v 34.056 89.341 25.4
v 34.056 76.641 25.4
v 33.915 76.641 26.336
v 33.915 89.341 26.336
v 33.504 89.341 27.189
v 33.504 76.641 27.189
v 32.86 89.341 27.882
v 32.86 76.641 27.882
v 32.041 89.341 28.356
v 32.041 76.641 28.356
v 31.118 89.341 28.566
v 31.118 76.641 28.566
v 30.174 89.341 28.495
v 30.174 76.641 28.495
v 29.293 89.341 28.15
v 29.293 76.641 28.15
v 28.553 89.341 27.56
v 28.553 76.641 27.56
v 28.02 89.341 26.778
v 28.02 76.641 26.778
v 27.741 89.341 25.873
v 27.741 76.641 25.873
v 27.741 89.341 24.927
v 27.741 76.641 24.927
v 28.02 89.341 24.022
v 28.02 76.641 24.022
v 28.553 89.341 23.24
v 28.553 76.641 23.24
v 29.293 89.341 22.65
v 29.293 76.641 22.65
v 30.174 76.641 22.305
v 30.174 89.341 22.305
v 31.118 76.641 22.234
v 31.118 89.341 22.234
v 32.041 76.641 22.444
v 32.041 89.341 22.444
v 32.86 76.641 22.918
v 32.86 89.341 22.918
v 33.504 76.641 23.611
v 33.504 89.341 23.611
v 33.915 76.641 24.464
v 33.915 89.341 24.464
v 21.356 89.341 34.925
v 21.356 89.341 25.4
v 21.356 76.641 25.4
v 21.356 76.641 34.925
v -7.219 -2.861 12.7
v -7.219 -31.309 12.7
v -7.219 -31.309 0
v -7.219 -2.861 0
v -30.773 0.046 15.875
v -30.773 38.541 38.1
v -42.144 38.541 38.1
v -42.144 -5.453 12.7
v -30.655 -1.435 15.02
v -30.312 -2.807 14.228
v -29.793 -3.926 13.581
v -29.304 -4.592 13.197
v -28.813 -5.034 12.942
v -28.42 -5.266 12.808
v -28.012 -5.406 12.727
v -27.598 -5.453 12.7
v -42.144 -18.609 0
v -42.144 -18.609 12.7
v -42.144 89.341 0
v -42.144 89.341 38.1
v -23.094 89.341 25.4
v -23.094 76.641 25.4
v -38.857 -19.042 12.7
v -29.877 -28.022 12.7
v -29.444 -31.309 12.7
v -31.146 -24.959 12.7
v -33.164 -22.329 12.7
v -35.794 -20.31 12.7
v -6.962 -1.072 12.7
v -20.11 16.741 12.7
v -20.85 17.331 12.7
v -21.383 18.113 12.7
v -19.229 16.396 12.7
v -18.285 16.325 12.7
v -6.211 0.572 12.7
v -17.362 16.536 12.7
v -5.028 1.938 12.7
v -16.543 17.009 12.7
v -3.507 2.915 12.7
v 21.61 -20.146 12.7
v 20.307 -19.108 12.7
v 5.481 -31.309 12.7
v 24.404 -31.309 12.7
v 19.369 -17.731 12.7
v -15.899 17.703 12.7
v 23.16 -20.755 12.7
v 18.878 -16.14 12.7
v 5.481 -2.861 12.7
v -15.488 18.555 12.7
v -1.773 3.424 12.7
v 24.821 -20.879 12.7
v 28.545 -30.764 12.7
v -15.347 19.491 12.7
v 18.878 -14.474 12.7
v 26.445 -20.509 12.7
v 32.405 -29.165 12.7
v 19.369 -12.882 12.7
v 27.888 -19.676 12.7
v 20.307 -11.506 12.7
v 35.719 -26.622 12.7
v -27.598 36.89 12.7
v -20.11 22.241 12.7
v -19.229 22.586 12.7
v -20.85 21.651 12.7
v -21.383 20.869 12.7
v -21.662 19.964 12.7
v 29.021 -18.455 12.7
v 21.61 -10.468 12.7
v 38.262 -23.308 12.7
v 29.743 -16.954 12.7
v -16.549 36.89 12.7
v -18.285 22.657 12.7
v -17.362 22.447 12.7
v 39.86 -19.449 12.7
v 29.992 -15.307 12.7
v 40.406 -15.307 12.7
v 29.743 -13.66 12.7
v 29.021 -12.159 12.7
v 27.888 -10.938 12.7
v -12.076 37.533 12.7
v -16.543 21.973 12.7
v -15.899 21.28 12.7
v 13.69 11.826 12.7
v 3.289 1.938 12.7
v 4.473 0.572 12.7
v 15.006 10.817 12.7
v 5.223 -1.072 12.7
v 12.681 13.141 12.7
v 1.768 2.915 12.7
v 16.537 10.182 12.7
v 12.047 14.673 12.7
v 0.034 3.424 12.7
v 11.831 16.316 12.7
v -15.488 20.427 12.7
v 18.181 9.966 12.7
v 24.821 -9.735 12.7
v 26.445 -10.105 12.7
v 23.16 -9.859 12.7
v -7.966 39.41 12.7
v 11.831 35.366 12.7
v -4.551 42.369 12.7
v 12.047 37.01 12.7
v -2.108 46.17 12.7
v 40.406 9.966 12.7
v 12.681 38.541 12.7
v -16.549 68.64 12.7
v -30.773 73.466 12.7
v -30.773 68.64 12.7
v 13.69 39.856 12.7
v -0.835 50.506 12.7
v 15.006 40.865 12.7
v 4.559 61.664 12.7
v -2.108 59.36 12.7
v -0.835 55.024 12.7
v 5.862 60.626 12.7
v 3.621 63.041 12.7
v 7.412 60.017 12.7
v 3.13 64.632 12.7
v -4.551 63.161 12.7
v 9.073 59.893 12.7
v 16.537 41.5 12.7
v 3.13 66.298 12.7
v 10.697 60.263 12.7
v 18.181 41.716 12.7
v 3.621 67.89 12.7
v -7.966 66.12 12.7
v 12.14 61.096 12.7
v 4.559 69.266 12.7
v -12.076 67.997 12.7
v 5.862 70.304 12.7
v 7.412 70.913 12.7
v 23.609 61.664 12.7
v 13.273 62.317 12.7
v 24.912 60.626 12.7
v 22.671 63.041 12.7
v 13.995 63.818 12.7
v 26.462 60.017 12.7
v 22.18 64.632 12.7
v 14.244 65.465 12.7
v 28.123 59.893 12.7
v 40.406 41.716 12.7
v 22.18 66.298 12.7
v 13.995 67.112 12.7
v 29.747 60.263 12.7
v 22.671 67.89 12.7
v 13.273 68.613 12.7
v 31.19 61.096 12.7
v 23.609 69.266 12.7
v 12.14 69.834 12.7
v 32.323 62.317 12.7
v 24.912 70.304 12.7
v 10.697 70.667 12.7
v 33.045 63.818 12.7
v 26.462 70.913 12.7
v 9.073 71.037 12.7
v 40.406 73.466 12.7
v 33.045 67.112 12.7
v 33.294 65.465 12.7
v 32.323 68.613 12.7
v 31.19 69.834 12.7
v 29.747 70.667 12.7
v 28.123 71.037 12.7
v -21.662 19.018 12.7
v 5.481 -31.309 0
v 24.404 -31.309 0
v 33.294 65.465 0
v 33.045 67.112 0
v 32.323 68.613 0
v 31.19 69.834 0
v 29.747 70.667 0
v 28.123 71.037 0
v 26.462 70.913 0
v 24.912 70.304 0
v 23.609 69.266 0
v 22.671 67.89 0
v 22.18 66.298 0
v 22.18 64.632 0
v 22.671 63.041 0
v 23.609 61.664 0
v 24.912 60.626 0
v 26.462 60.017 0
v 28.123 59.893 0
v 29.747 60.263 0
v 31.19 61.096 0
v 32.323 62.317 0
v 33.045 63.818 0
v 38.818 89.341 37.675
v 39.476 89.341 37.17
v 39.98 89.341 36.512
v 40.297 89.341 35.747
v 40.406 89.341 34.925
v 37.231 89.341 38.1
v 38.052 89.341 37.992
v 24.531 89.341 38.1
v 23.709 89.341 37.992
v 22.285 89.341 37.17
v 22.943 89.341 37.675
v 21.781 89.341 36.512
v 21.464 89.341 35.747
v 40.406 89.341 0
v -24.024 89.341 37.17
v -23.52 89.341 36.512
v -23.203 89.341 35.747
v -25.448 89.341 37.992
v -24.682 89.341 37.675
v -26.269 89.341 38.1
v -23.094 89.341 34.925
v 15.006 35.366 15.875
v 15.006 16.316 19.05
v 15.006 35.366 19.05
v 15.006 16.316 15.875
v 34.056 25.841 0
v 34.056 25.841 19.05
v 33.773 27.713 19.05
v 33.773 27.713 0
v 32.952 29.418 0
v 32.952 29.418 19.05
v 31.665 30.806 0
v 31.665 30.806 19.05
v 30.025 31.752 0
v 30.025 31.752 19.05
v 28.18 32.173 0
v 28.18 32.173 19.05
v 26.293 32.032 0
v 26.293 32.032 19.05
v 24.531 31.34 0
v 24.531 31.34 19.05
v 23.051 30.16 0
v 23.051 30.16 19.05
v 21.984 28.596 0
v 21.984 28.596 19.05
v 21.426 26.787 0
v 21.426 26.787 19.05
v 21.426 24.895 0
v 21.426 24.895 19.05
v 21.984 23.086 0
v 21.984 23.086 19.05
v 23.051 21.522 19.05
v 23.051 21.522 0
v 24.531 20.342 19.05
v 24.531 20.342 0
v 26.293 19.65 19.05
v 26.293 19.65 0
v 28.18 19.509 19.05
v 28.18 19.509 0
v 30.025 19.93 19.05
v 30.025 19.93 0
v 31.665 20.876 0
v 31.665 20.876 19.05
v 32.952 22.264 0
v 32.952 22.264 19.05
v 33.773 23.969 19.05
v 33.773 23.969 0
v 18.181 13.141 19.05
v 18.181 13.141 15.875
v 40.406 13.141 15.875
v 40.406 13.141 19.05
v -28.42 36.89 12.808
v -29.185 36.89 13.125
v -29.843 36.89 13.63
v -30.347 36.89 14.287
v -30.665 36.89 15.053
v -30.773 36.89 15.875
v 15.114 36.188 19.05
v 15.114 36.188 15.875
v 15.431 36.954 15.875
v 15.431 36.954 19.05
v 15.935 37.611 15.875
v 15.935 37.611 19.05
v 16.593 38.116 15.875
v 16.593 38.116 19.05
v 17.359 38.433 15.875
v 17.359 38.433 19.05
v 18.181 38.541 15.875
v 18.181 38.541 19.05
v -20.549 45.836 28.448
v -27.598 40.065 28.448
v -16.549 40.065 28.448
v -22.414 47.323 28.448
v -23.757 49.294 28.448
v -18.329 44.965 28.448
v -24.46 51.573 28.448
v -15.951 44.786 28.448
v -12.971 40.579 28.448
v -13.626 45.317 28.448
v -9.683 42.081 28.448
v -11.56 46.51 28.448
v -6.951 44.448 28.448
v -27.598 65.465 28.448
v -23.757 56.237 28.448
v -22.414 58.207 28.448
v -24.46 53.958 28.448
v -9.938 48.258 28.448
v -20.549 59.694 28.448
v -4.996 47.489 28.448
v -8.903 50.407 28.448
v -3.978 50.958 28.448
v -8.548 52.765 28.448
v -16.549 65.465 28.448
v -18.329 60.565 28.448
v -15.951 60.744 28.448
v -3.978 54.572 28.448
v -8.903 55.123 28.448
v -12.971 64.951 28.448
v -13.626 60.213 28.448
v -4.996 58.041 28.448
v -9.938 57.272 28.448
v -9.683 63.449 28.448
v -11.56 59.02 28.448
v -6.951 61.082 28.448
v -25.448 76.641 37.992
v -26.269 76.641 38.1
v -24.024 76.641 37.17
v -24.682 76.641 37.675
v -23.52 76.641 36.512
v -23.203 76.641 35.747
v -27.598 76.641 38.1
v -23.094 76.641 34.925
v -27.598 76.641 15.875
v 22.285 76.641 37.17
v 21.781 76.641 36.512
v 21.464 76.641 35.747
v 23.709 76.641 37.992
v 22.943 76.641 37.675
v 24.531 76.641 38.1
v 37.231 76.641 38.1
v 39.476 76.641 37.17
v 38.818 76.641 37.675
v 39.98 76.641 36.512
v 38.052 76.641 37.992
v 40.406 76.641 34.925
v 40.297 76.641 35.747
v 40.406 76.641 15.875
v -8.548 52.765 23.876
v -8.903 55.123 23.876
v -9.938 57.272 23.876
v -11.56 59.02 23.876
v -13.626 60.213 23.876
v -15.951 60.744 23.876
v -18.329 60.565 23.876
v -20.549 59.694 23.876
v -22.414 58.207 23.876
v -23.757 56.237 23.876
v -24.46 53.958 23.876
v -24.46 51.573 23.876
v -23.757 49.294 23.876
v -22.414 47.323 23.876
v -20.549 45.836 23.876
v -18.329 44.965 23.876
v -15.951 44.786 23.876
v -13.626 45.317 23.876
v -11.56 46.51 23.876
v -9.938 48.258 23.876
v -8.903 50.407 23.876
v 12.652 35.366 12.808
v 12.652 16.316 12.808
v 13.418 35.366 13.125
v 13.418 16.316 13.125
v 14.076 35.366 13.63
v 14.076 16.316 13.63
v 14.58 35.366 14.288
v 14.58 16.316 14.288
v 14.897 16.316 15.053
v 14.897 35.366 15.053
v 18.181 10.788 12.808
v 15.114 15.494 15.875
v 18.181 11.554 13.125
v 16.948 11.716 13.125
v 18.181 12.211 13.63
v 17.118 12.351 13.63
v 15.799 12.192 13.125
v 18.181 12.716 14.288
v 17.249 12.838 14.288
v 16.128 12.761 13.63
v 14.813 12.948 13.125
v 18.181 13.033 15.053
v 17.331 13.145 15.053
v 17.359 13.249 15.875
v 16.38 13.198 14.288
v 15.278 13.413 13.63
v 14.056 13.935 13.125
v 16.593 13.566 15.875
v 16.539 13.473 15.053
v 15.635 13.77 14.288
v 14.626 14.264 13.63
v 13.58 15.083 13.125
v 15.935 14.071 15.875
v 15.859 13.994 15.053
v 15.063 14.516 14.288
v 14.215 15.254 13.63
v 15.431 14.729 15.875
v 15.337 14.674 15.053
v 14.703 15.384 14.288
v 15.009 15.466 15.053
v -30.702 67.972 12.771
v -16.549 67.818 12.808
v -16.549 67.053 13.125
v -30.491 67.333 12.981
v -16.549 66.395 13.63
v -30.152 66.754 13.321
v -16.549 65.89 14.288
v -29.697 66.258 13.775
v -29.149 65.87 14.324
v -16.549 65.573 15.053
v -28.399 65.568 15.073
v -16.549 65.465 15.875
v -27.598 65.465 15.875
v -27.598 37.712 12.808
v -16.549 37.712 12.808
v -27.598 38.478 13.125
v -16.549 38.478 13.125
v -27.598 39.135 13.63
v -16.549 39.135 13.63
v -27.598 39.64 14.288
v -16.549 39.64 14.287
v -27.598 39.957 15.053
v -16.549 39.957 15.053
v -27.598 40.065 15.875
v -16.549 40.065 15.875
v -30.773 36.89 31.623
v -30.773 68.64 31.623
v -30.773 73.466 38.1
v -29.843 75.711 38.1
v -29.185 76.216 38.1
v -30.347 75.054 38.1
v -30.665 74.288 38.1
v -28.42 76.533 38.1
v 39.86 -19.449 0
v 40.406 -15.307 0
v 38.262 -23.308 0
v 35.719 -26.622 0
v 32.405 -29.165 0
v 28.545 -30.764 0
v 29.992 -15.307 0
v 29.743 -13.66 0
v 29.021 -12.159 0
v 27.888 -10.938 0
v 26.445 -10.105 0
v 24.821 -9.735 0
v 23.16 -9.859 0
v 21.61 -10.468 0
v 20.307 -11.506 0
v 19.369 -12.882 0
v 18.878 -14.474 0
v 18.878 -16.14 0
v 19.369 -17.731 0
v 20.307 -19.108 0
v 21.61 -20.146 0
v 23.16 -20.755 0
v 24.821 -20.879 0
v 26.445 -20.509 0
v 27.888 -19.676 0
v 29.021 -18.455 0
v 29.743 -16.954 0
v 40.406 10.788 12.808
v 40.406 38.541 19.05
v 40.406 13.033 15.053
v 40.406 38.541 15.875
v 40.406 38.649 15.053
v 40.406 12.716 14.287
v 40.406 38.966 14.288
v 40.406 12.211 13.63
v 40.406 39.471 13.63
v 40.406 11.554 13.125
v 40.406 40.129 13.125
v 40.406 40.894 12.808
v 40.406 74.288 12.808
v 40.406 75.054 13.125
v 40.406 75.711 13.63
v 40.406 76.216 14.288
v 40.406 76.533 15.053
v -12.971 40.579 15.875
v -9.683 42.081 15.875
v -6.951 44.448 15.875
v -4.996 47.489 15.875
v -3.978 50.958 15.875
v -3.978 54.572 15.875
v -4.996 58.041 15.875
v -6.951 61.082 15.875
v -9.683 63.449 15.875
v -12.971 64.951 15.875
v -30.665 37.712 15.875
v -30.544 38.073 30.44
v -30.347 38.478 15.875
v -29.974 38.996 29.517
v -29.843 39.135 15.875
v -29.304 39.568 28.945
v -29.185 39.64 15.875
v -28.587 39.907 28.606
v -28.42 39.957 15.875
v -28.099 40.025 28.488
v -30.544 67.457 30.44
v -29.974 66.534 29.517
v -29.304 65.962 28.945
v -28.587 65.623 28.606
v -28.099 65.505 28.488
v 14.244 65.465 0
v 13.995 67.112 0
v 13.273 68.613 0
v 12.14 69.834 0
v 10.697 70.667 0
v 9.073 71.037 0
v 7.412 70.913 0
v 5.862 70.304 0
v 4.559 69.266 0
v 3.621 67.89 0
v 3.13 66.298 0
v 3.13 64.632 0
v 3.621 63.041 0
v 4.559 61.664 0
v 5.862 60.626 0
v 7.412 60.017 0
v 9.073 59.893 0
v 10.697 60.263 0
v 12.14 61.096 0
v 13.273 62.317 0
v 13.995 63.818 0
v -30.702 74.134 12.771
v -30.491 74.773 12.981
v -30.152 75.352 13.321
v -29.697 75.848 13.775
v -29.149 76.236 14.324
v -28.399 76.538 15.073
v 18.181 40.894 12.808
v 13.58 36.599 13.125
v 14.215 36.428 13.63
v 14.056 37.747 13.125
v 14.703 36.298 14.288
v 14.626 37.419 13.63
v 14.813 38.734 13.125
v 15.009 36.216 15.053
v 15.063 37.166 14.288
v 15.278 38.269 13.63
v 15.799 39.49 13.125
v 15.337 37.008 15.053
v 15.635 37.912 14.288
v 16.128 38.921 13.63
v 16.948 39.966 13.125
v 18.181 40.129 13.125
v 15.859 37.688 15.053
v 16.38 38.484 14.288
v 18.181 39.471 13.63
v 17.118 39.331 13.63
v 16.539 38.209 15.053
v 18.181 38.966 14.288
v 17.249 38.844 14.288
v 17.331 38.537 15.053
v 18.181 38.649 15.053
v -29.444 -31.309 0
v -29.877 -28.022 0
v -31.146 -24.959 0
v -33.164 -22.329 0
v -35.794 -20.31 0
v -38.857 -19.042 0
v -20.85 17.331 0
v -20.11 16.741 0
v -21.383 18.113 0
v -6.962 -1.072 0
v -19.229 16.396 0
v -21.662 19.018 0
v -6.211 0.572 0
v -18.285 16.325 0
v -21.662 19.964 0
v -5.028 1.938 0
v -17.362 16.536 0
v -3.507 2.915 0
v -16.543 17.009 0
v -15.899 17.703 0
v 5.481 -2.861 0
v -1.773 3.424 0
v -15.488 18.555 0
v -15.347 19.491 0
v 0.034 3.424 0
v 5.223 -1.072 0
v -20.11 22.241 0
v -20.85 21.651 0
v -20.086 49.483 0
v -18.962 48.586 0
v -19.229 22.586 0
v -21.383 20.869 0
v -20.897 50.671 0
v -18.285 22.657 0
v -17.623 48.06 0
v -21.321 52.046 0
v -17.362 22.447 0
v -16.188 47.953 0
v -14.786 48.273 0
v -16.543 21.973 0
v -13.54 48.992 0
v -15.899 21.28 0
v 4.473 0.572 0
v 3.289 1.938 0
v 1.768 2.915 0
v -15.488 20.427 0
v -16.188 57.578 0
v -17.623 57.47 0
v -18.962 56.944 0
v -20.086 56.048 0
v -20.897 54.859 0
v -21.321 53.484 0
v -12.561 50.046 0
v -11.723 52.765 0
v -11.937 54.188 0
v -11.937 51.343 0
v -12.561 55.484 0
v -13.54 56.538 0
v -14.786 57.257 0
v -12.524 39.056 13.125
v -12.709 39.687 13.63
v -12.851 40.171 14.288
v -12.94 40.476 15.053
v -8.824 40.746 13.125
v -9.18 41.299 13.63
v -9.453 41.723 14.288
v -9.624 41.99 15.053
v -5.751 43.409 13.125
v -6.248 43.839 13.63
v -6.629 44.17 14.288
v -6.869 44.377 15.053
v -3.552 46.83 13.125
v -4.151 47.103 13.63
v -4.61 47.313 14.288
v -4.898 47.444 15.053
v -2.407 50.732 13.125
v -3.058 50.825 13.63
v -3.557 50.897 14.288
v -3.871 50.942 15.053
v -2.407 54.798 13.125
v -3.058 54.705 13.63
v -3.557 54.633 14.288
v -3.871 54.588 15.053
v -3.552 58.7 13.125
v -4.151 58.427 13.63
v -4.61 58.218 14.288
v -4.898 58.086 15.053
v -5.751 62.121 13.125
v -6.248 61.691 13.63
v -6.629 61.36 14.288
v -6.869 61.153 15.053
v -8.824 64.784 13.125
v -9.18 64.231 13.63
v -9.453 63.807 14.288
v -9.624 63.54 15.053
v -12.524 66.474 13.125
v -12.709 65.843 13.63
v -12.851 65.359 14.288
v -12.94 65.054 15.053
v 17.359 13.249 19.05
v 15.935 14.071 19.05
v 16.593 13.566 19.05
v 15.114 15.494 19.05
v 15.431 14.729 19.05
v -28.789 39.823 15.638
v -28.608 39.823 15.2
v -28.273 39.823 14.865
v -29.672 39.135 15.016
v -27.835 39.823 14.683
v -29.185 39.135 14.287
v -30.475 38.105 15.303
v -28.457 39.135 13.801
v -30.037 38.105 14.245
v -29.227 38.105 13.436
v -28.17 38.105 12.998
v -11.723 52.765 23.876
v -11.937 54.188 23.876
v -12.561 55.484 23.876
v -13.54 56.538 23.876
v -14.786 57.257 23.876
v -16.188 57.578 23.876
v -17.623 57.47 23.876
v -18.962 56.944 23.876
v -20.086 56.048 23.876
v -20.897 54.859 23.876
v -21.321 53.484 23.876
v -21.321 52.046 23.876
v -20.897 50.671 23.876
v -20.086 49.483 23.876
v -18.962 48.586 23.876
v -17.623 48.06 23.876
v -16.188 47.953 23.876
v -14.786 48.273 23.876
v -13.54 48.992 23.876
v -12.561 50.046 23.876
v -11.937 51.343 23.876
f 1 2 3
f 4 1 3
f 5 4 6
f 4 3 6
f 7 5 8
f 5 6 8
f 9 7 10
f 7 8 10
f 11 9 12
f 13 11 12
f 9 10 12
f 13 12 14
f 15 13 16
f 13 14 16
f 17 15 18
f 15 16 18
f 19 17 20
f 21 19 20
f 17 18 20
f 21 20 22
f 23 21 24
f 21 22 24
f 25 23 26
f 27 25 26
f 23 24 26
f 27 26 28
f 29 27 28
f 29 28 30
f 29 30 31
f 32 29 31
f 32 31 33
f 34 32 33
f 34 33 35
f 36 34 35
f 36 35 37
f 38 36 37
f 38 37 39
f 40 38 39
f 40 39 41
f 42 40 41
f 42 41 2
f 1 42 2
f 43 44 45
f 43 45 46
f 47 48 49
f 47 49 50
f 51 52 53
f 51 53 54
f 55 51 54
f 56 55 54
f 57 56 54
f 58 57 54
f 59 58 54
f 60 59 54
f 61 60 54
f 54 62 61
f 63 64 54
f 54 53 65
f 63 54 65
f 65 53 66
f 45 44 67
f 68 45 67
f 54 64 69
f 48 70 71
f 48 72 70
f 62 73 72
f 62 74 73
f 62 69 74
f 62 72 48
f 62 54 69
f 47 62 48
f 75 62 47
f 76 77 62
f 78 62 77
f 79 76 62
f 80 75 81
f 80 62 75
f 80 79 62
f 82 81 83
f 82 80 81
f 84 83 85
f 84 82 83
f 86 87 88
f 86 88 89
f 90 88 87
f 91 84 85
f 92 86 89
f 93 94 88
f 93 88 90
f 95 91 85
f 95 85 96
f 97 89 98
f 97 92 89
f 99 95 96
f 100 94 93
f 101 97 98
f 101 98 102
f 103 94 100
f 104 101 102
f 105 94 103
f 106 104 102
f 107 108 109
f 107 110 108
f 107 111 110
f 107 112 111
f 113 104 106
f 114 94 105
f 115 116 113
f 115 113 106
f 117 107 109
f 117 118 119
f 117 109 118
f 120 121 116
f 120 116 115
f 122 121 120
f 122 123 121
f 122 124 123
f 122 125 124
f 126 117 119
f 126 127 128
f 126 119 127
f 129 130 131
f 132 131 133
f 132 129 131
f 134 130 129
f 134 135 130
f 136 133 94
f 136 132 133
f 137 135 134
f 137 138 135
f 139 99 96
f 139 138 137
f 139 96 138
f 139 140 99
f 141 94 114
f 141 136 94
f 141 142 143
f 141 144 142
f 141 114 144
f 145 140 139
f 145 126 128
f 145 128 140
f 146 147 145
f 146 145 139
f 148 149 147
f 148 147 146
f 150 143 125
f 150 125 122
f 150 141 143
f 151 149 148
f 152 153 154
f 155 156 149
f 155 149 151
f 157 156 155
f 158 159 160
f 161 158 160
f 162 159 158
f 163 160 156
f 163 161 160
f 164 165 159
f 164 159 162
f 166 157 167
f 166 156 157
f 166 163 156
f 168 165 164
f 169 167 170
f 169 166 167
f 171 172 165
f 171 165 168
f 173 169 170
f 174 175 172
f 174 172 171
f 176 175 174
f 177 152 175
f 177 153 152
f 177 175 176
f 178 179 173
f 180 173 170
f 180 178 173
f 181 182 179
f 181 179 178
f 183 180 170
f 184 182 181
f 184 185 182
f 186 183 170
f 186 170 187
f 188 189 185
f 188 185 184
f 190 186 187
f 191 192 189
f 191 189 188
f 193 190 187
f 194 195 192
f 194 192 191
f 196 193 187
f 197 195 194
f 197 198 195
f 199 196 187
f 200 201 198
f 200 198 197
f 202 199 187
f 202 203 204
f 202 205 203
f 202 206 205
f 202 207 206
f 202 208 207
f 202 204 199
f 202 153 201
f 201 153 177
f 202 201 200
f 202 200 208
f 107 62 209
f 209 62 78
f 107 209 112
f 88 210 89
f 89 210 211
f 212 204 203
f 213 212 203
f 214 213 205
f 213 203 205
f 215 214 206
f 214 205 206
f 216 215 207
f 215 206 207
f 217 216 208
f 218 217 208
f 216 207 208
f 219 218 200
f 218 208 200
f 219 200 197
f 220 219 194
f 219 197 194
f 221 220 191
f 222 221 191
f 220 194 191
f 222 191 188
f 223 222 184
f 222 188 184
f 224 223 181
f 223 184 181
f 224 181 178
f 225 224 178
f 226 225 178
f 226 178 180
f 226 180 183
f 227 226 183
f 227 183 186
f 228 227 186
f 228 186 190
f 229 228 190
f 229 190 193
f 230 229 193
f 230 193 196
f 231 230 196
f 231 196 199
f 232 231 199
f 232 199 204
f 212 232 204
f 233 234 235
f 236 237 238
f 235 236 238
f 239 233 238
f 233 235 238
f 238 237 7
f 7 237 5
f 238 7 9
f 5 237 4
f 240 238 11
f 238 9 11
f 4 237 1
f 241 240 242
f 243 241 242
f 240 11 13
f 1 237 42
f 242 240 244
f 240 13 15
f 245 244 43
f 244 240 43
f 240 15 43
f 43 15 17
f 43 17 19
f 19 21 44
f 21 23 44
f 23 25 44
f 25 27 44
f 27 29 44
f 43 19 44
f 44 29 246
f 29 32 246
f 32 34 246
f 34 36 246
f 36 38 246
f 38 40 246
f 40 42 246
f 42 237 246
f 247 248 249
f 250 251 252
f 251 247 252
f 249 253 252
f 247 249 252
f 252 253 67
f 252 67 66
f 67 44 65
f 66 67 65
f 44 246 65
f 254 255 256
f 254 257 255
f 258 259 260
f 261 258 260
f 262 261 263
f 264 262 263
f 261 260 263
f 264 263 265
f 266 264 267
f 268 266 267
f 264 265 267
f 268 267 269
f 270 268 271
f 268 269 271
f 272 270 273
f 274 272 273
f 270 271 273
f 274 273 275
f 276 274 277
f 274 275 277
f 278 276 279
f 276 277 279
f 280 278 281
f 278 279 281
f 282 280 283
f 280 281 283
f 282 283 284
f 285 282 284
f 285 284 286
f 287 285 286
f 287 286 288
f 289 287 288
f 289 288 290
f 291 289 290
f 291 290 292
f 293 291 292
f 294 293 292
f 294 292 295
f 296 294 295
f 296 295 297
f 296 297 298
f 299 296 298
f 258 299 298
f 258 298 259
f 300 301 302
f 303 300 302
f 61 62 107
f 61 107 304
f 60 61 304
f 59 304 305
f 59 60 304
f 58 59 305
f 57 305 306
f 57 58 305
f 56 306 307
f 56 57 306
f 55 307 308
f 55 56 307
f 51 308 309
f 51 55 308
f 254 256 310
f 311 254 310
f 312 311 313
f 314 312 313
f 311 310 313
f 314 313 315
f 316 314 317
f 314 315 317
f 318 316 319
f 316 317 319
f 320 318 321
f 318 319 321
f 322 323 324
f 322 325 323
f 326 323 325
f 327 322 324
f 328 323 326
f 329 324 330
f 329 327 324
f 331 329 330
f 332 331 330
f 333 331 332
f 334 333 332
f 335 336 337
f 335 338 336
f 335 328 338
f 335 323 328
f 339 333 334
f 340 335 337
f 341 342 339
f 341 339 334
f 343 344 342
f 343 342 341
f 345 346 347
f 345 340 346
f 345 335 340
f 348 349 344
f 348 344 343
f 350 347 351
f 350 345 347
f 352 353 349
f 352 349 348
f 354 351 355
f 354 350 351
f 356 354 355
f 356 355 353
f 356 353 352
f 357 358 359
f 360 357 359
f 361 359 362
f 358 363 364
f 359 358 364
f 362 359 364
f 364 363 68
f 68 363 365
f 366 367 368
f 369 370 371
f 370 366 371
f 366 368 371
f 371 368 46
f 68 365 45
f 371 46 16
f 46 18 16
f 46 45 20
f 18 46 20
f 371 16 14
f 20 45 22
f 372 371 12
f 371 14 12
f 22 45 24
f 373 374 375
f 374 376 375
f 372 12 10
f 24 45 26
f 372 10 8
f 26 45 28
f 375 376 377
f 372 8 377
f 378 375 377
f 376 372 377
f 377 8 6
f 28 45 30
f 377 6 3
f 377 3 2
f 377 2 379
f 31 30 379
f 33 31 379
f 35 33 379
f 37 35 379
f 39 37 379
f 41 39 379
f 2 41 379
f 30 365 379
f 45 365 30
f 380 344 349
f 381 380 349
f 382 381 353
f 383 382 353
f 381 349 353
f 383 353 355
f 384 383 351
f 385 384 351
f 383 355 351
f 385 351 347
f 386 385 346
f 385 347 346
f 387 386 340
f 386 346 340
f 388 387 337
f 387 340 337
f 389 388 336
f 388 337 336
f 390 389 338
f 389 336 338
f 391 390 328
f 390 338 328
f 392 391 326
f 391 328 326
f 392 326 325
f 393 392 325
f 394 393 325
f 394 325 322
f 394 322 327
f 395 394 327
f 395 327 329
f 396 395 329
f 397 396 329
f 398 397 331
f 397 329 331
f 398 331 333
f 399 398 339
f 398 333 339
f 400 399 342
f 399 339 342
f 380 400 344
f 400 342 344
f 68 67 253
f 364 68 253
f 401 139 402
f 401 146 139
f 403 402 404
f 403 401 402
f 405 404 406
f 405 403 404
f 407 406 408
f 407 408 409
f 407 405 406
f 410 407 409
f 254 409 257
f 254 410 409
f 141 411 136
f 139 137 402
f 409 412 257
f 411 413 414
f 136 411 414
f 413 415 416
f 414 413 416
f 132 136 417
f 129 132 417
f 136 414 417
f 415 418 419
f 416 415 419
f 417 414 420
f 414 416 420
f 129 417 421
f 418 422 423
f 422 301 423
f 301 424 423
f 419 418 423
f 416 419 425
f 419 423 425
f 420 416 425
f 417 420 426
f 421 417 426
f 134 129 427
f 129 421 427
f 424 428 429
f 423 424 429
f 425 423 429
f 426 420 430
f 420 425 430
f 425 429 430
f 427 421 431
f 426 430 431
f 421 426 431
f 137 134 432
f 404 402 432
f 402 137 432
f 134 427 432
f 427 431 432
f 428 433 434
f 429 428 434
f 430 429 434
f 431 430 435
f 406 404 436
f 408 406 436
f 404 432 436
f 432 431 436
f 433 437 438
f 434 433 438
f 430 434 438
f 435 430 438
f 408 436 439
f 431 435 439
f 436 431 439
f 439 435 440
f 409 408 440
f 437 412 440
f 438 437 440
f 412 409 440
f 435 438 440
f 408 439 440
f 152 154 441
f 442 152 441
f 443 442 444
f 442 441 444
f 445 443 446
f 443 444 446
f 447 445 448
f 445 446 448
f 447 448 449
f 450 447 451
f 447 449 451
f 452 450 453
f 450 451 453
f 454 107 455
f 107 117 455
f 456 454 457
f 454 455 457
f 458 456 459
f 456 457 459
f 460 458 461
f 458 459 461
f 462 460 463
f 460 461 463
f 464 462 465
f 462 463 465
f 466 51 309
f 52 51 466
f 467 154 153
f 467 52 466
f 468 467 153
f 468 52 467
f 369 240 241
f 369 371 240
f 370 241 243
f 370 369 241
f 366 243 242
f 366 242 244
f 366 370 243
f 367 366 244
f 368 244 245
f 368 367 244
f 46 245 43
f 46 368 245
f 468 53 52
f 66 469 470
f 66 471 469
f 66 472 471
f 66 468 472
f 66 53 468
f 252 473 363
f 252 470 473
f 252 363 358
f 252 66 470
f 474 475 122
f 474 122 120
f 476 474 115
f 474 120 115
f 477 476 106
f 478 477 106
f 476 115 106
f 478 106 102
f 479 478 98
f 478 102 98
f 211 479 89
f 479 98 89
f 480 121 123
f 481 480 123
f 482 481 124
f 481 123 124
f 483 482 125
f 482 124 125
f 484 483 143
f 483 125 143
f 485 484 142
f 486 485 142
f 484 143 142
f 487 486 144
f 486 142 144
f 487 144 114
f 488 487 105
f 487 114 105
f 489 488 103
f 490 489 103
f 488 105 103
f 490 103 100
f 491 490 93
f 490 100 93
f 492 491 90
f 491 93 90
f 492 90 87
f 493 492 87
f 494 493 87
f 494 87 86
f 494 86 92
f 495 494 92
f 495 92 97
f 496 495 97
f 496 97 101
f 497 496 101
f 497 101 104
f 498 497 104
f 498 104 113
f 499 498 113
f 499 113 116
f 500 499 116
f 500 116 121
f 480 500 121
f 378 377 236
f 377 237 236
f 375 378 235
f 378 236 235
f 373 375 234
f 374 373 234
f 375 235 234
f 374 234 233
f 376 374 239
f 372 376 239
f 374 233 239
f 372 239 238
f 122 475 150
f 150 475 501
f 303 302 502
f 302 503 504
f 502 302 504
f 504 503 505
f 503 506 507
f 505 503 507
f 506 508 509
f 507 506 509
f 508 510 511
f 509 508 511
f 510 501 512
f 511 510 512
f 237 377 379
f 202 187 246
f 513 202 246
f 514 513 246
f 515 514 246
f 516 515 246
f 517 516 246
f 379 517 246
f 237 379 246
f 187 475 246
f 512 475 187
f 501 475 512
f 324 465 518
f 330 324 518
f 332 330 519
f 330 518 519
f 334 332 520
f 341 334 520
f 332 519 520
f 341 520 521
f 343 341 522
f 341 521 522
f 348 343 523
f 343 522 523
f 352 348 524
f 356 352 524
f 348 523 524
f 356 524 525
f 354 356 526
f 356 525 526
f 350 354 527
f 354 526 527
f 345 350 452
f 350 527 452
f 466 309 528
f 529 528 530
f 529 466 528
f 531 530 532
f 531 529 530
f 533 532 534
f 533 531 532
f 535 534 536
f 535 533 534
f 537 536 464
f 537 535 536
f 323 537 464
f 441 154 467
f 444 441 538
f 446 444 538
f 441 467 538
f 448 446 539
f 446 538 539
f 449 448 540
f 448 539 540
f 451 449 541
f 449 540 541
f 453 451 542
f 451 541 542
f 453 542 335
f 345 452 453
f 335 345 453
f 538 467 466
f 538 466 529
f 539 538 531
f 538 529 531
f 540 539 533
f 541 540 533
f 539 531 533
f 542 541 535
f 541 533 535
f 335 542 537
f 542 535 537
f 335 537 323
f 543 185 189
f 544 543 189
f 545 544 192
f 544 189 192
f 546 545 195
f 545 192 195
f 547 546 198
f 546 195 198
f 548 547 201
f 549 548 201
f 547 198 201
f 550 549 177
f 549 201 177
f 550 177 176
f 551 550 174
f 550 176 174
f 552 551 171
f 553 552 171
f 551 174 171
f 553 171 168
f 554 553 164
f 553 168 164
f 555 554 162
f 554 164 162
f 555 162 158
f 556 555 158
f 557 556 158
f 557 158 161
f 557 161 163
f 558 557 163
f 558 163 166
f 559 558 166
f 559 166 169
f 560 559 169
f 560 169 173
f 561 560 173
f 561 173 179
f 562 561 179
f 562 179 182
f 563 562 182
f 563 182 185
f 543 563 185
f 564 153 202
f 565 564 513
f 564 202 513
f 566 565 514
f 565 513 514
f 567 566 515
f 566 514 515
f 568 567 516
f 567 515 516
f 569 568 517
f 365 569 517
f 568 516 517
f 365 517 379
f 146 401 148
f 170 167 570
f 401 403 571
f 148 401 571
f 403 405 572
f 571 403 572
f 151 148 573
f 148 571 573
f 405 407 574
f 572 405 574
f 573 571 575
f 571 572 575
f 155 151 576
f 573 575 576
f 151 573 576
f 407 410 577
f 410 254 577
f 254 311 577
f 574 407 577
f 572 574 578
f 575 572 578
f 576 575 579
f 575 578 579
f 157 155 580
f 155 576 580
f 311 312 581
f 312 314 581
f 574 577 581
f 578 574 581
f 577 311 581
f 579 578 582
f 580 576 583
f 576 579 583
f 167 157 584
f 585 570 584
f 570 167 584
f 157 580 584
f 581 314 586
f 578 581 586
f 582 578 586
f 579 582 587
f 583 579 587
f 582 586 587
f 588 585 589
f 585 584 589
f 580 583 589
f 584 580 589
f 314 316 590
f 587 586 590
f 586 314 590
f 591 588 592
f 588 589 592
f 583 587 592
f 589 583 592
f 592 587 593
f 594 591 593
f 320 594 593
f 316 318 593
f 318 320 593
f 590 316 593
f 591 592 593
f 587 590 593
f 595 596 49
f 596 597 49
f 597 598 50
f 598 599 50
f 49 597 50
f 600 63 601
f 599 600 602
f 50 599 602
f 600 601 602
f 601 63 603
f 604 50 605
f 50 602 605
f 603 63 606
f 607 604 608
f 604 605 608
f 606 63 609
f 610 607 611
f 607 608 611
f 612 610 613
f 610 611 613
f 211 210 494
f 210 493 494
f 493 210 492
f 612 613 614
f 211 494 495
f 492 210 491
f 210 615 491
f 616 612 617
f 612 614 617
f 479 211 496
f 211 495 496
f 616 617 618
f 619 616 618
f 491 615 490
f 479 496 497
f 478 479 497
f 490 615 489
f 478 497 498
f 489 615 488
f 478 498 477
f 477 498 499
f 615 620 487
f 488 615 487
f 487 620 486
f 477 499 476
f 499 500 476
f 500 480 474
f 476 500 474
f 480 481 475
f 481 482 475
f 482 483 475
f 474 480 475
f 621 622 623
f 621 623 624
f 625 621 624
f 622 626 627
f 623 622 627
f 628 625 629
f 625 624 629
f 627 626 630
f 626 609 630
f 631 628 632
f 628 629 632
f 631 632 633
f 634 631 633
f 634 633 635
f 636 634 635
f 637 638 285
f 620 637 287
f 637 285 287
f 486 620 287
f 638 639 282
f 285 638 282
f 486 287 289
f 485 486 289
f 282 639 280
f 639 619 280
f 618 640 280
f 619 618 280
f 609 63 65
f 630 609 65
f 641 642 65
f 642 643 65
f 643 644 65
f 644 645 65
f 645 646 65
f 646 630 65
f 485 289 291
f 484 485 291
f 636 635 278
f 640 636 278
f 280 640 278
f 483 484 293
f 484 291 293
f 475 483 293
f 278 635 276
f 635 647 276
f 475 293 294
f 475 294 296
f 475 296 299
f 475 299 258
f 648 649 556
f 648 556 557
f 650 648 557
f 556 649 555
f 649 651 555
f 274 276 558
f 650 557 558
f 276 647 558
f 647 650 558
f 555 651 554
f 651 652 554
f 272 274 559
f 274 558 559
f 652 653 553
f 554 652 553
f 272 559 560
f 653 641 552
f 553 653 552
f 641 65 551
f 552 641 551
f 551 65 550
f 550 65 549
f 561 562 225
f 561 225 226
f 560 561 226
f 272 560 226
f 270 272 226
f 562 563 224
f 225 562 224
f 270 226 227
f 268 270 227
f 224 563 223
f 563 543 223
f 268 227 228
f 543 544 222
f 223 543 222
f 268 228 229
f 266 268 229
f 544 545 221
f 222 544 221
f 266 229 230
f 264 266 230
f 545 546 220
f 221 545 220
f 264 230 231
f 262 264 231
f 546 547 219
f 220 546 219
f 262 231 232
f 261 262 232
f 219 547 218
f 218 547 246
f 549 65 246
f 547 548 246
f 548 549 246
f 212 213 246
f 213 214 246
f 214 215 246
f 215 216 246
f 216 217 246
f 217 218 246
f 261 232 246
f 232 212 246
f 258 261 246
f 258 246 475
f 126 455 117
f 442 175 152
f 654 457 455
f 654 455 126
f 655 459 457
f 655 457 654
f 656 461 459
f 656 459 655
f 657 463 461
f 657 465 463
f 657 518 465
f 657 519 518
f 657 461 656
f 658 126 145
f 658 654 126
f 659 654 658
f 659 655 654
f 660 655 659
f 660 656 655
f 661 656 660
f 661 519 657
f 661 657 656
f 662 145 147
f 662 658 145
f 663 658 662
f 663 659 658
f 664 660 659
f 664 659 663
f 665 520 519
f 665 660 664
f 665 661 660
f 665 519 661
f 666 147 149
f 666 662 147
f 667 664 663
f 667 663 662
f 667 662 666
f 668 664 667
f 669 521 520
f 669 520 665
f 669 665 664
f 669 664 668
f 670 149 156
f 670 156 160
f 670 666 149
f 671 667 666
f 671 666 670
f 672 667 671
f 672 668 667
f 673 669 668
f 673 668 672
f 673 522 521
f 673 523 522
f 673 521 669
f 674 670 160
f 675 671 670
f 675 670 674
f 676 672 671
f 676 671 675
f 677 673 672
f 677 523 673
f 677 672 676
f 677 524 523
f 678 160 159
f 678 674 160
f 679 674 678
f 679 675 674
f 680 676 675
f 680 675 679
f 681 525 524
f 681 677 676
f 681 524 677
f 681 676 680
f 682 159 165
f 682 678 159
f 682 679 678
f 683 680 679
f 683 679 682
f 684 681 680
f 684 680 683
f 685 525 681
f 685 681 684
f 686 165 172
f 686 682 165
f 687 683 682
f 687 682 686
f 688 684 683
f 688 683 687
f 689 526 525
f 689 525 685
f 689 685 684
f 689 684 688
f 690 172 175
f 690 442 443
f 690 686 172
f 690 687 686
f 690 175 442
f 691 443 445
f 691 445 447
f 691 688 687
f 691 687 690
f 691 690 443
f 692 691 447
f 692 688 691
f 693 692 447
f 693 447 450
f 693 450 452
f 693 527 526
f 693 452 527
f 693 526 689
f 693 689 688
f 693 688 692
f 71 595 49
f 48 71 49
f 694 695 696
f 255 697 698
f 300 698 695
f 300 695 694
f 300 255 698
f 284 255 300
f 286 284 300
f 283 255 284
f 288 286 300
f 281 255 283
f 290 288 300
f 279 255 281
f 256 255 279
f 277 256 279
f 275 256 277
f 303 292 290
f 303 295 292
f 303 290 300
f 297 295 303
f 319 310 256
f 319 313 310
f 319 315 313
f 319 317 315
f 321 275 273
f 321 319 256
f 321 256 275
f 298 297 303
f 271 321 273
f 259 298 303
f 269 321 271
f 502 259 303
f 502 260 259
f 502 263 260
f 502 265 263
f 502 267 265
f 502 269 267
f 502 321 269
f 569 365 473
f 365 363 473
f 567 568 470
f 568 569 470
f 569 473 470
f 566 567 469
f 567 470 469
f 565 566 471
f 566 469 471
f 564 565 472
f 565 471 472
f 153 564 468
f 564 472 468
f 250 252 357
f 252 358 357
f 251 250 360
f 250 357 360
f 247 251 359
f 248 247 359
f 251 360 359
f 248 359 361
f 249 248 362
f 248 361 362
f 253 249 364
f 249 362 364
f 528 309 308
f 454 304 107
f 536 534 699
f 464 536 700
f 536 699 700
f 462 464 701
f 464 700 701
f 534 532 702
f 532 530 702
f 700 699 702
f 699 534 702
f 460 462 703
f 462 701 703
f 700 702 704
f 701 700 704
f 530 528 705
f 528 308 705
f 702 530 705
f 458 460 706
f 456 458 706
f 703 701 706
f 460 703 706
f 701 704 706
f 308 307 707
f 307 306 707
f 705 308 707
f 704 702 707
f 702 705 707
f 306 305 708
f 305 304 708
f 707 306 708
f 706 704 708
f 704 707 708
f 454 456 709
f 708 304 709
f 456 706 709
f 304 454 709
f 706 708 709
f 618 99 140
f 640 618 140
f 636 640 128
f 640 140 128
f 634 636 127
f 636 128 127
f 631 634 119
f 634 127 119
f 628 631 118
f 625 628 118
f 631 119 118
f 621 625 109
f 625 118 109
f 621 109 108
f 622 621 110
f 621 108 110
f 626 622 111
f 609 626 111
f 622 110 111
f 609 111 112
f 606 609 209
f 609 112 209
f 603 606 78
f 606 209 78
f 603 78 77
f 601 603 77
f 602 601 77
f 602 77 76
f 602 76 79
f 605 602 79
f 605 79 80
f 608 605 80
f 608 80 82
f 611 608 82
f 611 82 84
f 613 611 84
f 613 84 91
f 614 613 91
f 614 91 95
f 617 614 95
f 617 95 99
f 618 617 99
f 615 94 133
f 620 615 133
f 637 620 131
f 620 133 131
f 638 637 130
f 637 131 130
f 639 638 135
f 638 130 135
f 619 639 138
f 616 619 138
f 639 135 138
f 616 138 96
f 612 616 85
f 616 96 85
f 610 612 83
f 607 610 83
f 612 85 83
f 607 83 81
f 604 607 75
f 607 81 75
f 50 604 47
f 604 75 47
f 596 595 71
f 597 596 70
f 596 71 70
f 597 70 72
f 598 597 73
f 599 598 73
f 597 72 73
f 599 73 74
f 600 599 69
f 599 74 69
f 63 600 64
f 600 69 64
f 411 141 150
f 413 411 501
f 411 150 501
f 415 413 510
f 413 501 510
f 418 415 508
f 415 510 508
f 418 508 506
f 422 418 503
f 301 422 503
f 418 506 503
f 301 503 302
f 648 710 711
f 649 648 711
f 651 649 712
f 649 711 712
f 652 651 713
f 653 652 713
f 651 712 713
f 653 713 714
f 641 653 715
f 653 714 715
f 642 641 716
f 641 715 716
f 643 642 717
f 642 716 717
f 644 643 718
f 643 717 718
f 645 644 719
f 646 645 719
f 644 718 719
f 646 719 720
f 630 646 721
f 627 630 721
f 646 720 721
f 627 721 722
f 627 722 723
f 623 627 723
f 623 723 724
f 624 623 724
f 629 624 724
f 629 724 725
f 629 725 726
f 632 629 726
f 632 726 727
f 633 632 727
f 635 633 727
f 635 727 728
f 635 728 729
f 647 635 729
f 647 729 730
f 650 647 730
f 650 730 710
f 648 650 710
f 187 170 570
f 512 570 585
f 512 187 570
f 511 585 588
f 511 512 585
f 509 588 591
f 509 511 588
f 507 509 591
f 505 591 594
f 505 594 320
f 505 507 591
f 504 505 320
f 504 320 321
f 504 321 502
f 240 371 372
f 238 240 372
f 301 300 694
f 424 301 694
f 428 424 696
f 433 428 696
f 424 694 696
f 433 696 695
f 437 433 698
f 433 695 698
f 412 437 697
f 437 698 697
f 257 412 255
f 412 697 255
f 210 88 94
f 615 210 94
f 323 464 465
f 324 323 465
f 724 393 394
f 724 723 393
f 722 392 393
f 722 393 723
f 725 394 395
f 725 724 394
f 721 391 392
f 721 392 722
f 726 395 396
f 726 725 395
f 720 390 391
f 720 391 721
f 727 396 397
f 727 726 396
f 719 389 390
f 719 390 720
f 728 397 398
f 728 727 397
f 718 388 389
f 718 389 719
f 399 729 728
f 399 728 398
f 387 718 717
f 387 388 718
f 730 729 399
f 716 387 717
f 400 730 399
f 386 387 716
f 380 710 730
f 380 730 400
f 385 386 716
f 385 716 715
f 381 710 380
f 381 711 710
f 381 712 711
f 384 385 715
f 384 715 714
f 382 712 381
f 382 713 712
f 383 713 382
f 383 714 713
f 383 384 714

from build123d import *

# Parameters (mm, degrees)
F0_W      = 82.55
F0_H      = 120.65
F1_DEPTH  = 12.7
F3_DEPTH  = 25.4
F5_DEPTH  = 11.3716514647
F6_W      = 44.45
F6_H      = 12.7
F7_DEPTH  = 25.4
F8_W      = 25.4
F8_H      = 25.4
F9_DEPTH  = 6.35
F10_R     = 6.35
F11_DEPTH = 19.051
F13_DEPTH = 15.748
F14_R     = 4.826
F15_DEPTH = 28.449
F16_R     = 8.001
F16_R_2   = 4.826
F17_DEPTH = 4.572
F18_W     = 12.7
F18_H     = 28.448
F19_DEPTH = 25.4
F20_R     = 3.175
F20_R_2   = 5.588
F21_DEPTH = 12.701
F22_R     = 3.175
F23_DEPTH = 25.4
F25_DEPTH = 25.4
F26_R     = 16.002
F27_R     = 3.175


with BuildPart() as f1:
    # F0 (on Top) → F1 (new body)
    with BuildSketch(Plane.XY):
        with Locations((-0.8694417775, 29.0160470424)):
            Rectangle(F0_W, F0_H)
    extrude(amount=F1_DEPTH)

    # F2 (on face) → F3 (join)
    with BuildSketch(Plane.XY.offset(12.7)):
        Polygon((-30.7727903128, 89.3410470424), (-42.1444417775, 89.3410470424), (-42.1444417775, 76.6410470424), (-42.1444417775, 38.5410470424), (-30.7727903128, 38.5410470424), (-30.7727903128, 76.6410470424), (40.4055582225, 76.6410470424), (40.4055582225, 89.3410470424), align=None)
    extrude(amount=F3_DEPTH)

    # F4 (on face) → F5 (join, through all)
    with BuildSketch(Plane.YZ.offset(-30.7727903128)):
        Polygon((38.5410470424, 12.7), (38.5410470424, 38.1), (-5.4530434699, 12.7), align=None)
    extrude(amount=-F5_DEPTH)

    # F6 (on face) → F7 (cut)
    with BuildSketch(Plane(origin=(0, 89.3410470424, 0), x_dir=(-1, 0, 0), z_dir=(0, 1, 0))):
        with Locations((0.8694417775, 31.75)):
            Rectangle(F6_W, F6_H)
    extrude(amount=-F7_DEPTH, mode=Mode.SUBTRACT)

    # F8 (on face) → F9 (join)
    with BuildSketch(Plane.XY.offset(12.7)):
        with Locations((27.7055582225, 25.8410470424)):
            Rectangle(F8_W, F8_H)
    extrude(amount=F9_DEPTH)

    # F10 (on face) → F11 (cut, through all)
    with BuildSketch(Plane.XY.offset(19.05)):
        with Locations((27.7055582225, 25.8410470424)):
            Circle(F10_R)
    extrude(amount=-F11_DEPTH, mode=Mode.SUBTRACT)

    # F12 (on face) → F13 (join)
    with BuildSketch(Plane.XY.offset(12.7)):
        with BuildLine():
            Line((-30.7727903128, 65.4650470424), (-30.7727903128, 40.0650470424))
            Line((-30.7727903128, 40.0650470424), (-16.5487903128, 40.0650470424))
            ThreePointArc((-16.5487903128, 40.0650470424), (-3.8487903128, 52.7650470424), (-16.5487903128, 65.4650470424))
            Line((-16.5487903128, 65.4650470424), (-30.7727903128, 65.4650470424))
        make_face()
    extrude(amount=F13_DEPTH)

    # F14 (on face) → F15 (cut, through all)
    with BuildSketch(Plane.XY.offset(28.448)):
        with Locations((-16.5487903128, 52.7650470424)):
            Circle(F14_R)
    extrude(amount=-F15_DEPTH, mode=Mode.SUBTRACT)

    # F16 (on face) → F17 (cut)
    with BuildSketch(Plane.XY.offset(28.448)):
        with Locations((-16.5487903128, 52.7650470424)):
            Circle(F16_R)
        with Locations((-16.5487903128, 52.7650470424)):
            Circle(F16_R_2, mode=Mode.SUBTRACT)
    extrude(amount=-F17_DEPTH, mode=Mode.SUBTRACT)

    # F18 (on face) → F19 (cut)
    with BuildSketch(Plane.XY.offset(12.7)):
        with Locations((-0.8694417775, -17.0849529576)):
            Rectangle(F18_W, F18_H)
        with BuildLine():
            ThreePointArc((5.4805582225, -2.8609529576), (-0.8694417775, 3.4890470424), (-7.2194417775, -2.8609529576))
            Line((-7.2194417775, -2.8609529576), (5.4805582225, -2.8609529576))
        make_face()
    extrude(amount=-F19_DEPTH, mode=Mode.SUBTRACT)

    # F20 (on face) → F21 (cut, through all)
    with BuildSketch(Plane.XY.offset(12.7)):
        with Locations((-18.5224417775, 19.4910470424)):
            Circle(F20_R)
        with Locations((24.4035582225, -15.3069529576)):
            Circle(F20_R_2)
        with Locations((27.7055582225, 65.4650470424)):
            Circle(F20_R_2)
        with Locations((8.6555582225, 65.4650470424)):
            Circle(F20_R_2)
    extrude(amount=-F21_DEPTH, mode=Mode.SUBTRACT)

    # F22 (on face) → F23 (cut)
    with BuildSketch(Plane.XZ.offset(-76.6410470424)):
        with Locations((30.8805582225, 25.4)):
            Circle(F22_R)
    extrude(amount=-F23_DEPTH, mode=Mode.SUBTRACT)

    # F24 (on face) → F25 (cut)
    with BuildSketch(Plane.XY.offset(12.7)):
        with BuildLine():
            Line((-42.1444417775, -31.3089529576), (-29.4444417775, -31.3089529576))
            ThreePointArc((-29.4444417775, -31.3089529576), (-33.1641856564, -22.3286968366), (-42.1444417775, -18.6089529576))
            Line((-42.1444417775, -18.6089529576), (-42.1444417775, -31.3089529576))
        make_face()
    extrude(amount=-F25_DEPTH, mode=Mode.SUBTRACT)

    # F26
    f26_edges = [f1.edges().sort_by_distance(p)[0] for p in [
        (40.405558, -31.308953, 6.35),
    ]]
    fillet(f26_edges, radius=F26_R)

    # F27
    f27_edges = [f1.edges().sort_by_distance(p)[0] for p in [
        (-30.77279, 17.306002, 12.7),
        (-30.77279, 40.065047, 20.574),
        (-23.66079, 40.065047, 12.7),
        (-30.77279, 52.765047, 28.448),
        (4.816384, 76.641047, 12.7),
        (-30.77279, 65.465047, 20.574),
        (-30.77279, 76.641047, 25.4),
        (15.005558, 13.141047, 15.875),
        (15.005558, 38.541047, 15.875),
        (-23.094442, 82.991047, 38.1),
        (40.405558, 82.991047, 38.1),
        (21.355558, 82.991047, 38.1),
        (27.705558, 13.141047, 12.7),
        (15.005558, 25.841047, 12.7),
        (27.705558, 38.541047, 12.7),
        (-23.66079, 65.465047, 12.7),
        (-3.84879, 52.765047, 12.7),
    ]]
    fillet(f27_edges, radius=F27_R)


solid = f1.part
